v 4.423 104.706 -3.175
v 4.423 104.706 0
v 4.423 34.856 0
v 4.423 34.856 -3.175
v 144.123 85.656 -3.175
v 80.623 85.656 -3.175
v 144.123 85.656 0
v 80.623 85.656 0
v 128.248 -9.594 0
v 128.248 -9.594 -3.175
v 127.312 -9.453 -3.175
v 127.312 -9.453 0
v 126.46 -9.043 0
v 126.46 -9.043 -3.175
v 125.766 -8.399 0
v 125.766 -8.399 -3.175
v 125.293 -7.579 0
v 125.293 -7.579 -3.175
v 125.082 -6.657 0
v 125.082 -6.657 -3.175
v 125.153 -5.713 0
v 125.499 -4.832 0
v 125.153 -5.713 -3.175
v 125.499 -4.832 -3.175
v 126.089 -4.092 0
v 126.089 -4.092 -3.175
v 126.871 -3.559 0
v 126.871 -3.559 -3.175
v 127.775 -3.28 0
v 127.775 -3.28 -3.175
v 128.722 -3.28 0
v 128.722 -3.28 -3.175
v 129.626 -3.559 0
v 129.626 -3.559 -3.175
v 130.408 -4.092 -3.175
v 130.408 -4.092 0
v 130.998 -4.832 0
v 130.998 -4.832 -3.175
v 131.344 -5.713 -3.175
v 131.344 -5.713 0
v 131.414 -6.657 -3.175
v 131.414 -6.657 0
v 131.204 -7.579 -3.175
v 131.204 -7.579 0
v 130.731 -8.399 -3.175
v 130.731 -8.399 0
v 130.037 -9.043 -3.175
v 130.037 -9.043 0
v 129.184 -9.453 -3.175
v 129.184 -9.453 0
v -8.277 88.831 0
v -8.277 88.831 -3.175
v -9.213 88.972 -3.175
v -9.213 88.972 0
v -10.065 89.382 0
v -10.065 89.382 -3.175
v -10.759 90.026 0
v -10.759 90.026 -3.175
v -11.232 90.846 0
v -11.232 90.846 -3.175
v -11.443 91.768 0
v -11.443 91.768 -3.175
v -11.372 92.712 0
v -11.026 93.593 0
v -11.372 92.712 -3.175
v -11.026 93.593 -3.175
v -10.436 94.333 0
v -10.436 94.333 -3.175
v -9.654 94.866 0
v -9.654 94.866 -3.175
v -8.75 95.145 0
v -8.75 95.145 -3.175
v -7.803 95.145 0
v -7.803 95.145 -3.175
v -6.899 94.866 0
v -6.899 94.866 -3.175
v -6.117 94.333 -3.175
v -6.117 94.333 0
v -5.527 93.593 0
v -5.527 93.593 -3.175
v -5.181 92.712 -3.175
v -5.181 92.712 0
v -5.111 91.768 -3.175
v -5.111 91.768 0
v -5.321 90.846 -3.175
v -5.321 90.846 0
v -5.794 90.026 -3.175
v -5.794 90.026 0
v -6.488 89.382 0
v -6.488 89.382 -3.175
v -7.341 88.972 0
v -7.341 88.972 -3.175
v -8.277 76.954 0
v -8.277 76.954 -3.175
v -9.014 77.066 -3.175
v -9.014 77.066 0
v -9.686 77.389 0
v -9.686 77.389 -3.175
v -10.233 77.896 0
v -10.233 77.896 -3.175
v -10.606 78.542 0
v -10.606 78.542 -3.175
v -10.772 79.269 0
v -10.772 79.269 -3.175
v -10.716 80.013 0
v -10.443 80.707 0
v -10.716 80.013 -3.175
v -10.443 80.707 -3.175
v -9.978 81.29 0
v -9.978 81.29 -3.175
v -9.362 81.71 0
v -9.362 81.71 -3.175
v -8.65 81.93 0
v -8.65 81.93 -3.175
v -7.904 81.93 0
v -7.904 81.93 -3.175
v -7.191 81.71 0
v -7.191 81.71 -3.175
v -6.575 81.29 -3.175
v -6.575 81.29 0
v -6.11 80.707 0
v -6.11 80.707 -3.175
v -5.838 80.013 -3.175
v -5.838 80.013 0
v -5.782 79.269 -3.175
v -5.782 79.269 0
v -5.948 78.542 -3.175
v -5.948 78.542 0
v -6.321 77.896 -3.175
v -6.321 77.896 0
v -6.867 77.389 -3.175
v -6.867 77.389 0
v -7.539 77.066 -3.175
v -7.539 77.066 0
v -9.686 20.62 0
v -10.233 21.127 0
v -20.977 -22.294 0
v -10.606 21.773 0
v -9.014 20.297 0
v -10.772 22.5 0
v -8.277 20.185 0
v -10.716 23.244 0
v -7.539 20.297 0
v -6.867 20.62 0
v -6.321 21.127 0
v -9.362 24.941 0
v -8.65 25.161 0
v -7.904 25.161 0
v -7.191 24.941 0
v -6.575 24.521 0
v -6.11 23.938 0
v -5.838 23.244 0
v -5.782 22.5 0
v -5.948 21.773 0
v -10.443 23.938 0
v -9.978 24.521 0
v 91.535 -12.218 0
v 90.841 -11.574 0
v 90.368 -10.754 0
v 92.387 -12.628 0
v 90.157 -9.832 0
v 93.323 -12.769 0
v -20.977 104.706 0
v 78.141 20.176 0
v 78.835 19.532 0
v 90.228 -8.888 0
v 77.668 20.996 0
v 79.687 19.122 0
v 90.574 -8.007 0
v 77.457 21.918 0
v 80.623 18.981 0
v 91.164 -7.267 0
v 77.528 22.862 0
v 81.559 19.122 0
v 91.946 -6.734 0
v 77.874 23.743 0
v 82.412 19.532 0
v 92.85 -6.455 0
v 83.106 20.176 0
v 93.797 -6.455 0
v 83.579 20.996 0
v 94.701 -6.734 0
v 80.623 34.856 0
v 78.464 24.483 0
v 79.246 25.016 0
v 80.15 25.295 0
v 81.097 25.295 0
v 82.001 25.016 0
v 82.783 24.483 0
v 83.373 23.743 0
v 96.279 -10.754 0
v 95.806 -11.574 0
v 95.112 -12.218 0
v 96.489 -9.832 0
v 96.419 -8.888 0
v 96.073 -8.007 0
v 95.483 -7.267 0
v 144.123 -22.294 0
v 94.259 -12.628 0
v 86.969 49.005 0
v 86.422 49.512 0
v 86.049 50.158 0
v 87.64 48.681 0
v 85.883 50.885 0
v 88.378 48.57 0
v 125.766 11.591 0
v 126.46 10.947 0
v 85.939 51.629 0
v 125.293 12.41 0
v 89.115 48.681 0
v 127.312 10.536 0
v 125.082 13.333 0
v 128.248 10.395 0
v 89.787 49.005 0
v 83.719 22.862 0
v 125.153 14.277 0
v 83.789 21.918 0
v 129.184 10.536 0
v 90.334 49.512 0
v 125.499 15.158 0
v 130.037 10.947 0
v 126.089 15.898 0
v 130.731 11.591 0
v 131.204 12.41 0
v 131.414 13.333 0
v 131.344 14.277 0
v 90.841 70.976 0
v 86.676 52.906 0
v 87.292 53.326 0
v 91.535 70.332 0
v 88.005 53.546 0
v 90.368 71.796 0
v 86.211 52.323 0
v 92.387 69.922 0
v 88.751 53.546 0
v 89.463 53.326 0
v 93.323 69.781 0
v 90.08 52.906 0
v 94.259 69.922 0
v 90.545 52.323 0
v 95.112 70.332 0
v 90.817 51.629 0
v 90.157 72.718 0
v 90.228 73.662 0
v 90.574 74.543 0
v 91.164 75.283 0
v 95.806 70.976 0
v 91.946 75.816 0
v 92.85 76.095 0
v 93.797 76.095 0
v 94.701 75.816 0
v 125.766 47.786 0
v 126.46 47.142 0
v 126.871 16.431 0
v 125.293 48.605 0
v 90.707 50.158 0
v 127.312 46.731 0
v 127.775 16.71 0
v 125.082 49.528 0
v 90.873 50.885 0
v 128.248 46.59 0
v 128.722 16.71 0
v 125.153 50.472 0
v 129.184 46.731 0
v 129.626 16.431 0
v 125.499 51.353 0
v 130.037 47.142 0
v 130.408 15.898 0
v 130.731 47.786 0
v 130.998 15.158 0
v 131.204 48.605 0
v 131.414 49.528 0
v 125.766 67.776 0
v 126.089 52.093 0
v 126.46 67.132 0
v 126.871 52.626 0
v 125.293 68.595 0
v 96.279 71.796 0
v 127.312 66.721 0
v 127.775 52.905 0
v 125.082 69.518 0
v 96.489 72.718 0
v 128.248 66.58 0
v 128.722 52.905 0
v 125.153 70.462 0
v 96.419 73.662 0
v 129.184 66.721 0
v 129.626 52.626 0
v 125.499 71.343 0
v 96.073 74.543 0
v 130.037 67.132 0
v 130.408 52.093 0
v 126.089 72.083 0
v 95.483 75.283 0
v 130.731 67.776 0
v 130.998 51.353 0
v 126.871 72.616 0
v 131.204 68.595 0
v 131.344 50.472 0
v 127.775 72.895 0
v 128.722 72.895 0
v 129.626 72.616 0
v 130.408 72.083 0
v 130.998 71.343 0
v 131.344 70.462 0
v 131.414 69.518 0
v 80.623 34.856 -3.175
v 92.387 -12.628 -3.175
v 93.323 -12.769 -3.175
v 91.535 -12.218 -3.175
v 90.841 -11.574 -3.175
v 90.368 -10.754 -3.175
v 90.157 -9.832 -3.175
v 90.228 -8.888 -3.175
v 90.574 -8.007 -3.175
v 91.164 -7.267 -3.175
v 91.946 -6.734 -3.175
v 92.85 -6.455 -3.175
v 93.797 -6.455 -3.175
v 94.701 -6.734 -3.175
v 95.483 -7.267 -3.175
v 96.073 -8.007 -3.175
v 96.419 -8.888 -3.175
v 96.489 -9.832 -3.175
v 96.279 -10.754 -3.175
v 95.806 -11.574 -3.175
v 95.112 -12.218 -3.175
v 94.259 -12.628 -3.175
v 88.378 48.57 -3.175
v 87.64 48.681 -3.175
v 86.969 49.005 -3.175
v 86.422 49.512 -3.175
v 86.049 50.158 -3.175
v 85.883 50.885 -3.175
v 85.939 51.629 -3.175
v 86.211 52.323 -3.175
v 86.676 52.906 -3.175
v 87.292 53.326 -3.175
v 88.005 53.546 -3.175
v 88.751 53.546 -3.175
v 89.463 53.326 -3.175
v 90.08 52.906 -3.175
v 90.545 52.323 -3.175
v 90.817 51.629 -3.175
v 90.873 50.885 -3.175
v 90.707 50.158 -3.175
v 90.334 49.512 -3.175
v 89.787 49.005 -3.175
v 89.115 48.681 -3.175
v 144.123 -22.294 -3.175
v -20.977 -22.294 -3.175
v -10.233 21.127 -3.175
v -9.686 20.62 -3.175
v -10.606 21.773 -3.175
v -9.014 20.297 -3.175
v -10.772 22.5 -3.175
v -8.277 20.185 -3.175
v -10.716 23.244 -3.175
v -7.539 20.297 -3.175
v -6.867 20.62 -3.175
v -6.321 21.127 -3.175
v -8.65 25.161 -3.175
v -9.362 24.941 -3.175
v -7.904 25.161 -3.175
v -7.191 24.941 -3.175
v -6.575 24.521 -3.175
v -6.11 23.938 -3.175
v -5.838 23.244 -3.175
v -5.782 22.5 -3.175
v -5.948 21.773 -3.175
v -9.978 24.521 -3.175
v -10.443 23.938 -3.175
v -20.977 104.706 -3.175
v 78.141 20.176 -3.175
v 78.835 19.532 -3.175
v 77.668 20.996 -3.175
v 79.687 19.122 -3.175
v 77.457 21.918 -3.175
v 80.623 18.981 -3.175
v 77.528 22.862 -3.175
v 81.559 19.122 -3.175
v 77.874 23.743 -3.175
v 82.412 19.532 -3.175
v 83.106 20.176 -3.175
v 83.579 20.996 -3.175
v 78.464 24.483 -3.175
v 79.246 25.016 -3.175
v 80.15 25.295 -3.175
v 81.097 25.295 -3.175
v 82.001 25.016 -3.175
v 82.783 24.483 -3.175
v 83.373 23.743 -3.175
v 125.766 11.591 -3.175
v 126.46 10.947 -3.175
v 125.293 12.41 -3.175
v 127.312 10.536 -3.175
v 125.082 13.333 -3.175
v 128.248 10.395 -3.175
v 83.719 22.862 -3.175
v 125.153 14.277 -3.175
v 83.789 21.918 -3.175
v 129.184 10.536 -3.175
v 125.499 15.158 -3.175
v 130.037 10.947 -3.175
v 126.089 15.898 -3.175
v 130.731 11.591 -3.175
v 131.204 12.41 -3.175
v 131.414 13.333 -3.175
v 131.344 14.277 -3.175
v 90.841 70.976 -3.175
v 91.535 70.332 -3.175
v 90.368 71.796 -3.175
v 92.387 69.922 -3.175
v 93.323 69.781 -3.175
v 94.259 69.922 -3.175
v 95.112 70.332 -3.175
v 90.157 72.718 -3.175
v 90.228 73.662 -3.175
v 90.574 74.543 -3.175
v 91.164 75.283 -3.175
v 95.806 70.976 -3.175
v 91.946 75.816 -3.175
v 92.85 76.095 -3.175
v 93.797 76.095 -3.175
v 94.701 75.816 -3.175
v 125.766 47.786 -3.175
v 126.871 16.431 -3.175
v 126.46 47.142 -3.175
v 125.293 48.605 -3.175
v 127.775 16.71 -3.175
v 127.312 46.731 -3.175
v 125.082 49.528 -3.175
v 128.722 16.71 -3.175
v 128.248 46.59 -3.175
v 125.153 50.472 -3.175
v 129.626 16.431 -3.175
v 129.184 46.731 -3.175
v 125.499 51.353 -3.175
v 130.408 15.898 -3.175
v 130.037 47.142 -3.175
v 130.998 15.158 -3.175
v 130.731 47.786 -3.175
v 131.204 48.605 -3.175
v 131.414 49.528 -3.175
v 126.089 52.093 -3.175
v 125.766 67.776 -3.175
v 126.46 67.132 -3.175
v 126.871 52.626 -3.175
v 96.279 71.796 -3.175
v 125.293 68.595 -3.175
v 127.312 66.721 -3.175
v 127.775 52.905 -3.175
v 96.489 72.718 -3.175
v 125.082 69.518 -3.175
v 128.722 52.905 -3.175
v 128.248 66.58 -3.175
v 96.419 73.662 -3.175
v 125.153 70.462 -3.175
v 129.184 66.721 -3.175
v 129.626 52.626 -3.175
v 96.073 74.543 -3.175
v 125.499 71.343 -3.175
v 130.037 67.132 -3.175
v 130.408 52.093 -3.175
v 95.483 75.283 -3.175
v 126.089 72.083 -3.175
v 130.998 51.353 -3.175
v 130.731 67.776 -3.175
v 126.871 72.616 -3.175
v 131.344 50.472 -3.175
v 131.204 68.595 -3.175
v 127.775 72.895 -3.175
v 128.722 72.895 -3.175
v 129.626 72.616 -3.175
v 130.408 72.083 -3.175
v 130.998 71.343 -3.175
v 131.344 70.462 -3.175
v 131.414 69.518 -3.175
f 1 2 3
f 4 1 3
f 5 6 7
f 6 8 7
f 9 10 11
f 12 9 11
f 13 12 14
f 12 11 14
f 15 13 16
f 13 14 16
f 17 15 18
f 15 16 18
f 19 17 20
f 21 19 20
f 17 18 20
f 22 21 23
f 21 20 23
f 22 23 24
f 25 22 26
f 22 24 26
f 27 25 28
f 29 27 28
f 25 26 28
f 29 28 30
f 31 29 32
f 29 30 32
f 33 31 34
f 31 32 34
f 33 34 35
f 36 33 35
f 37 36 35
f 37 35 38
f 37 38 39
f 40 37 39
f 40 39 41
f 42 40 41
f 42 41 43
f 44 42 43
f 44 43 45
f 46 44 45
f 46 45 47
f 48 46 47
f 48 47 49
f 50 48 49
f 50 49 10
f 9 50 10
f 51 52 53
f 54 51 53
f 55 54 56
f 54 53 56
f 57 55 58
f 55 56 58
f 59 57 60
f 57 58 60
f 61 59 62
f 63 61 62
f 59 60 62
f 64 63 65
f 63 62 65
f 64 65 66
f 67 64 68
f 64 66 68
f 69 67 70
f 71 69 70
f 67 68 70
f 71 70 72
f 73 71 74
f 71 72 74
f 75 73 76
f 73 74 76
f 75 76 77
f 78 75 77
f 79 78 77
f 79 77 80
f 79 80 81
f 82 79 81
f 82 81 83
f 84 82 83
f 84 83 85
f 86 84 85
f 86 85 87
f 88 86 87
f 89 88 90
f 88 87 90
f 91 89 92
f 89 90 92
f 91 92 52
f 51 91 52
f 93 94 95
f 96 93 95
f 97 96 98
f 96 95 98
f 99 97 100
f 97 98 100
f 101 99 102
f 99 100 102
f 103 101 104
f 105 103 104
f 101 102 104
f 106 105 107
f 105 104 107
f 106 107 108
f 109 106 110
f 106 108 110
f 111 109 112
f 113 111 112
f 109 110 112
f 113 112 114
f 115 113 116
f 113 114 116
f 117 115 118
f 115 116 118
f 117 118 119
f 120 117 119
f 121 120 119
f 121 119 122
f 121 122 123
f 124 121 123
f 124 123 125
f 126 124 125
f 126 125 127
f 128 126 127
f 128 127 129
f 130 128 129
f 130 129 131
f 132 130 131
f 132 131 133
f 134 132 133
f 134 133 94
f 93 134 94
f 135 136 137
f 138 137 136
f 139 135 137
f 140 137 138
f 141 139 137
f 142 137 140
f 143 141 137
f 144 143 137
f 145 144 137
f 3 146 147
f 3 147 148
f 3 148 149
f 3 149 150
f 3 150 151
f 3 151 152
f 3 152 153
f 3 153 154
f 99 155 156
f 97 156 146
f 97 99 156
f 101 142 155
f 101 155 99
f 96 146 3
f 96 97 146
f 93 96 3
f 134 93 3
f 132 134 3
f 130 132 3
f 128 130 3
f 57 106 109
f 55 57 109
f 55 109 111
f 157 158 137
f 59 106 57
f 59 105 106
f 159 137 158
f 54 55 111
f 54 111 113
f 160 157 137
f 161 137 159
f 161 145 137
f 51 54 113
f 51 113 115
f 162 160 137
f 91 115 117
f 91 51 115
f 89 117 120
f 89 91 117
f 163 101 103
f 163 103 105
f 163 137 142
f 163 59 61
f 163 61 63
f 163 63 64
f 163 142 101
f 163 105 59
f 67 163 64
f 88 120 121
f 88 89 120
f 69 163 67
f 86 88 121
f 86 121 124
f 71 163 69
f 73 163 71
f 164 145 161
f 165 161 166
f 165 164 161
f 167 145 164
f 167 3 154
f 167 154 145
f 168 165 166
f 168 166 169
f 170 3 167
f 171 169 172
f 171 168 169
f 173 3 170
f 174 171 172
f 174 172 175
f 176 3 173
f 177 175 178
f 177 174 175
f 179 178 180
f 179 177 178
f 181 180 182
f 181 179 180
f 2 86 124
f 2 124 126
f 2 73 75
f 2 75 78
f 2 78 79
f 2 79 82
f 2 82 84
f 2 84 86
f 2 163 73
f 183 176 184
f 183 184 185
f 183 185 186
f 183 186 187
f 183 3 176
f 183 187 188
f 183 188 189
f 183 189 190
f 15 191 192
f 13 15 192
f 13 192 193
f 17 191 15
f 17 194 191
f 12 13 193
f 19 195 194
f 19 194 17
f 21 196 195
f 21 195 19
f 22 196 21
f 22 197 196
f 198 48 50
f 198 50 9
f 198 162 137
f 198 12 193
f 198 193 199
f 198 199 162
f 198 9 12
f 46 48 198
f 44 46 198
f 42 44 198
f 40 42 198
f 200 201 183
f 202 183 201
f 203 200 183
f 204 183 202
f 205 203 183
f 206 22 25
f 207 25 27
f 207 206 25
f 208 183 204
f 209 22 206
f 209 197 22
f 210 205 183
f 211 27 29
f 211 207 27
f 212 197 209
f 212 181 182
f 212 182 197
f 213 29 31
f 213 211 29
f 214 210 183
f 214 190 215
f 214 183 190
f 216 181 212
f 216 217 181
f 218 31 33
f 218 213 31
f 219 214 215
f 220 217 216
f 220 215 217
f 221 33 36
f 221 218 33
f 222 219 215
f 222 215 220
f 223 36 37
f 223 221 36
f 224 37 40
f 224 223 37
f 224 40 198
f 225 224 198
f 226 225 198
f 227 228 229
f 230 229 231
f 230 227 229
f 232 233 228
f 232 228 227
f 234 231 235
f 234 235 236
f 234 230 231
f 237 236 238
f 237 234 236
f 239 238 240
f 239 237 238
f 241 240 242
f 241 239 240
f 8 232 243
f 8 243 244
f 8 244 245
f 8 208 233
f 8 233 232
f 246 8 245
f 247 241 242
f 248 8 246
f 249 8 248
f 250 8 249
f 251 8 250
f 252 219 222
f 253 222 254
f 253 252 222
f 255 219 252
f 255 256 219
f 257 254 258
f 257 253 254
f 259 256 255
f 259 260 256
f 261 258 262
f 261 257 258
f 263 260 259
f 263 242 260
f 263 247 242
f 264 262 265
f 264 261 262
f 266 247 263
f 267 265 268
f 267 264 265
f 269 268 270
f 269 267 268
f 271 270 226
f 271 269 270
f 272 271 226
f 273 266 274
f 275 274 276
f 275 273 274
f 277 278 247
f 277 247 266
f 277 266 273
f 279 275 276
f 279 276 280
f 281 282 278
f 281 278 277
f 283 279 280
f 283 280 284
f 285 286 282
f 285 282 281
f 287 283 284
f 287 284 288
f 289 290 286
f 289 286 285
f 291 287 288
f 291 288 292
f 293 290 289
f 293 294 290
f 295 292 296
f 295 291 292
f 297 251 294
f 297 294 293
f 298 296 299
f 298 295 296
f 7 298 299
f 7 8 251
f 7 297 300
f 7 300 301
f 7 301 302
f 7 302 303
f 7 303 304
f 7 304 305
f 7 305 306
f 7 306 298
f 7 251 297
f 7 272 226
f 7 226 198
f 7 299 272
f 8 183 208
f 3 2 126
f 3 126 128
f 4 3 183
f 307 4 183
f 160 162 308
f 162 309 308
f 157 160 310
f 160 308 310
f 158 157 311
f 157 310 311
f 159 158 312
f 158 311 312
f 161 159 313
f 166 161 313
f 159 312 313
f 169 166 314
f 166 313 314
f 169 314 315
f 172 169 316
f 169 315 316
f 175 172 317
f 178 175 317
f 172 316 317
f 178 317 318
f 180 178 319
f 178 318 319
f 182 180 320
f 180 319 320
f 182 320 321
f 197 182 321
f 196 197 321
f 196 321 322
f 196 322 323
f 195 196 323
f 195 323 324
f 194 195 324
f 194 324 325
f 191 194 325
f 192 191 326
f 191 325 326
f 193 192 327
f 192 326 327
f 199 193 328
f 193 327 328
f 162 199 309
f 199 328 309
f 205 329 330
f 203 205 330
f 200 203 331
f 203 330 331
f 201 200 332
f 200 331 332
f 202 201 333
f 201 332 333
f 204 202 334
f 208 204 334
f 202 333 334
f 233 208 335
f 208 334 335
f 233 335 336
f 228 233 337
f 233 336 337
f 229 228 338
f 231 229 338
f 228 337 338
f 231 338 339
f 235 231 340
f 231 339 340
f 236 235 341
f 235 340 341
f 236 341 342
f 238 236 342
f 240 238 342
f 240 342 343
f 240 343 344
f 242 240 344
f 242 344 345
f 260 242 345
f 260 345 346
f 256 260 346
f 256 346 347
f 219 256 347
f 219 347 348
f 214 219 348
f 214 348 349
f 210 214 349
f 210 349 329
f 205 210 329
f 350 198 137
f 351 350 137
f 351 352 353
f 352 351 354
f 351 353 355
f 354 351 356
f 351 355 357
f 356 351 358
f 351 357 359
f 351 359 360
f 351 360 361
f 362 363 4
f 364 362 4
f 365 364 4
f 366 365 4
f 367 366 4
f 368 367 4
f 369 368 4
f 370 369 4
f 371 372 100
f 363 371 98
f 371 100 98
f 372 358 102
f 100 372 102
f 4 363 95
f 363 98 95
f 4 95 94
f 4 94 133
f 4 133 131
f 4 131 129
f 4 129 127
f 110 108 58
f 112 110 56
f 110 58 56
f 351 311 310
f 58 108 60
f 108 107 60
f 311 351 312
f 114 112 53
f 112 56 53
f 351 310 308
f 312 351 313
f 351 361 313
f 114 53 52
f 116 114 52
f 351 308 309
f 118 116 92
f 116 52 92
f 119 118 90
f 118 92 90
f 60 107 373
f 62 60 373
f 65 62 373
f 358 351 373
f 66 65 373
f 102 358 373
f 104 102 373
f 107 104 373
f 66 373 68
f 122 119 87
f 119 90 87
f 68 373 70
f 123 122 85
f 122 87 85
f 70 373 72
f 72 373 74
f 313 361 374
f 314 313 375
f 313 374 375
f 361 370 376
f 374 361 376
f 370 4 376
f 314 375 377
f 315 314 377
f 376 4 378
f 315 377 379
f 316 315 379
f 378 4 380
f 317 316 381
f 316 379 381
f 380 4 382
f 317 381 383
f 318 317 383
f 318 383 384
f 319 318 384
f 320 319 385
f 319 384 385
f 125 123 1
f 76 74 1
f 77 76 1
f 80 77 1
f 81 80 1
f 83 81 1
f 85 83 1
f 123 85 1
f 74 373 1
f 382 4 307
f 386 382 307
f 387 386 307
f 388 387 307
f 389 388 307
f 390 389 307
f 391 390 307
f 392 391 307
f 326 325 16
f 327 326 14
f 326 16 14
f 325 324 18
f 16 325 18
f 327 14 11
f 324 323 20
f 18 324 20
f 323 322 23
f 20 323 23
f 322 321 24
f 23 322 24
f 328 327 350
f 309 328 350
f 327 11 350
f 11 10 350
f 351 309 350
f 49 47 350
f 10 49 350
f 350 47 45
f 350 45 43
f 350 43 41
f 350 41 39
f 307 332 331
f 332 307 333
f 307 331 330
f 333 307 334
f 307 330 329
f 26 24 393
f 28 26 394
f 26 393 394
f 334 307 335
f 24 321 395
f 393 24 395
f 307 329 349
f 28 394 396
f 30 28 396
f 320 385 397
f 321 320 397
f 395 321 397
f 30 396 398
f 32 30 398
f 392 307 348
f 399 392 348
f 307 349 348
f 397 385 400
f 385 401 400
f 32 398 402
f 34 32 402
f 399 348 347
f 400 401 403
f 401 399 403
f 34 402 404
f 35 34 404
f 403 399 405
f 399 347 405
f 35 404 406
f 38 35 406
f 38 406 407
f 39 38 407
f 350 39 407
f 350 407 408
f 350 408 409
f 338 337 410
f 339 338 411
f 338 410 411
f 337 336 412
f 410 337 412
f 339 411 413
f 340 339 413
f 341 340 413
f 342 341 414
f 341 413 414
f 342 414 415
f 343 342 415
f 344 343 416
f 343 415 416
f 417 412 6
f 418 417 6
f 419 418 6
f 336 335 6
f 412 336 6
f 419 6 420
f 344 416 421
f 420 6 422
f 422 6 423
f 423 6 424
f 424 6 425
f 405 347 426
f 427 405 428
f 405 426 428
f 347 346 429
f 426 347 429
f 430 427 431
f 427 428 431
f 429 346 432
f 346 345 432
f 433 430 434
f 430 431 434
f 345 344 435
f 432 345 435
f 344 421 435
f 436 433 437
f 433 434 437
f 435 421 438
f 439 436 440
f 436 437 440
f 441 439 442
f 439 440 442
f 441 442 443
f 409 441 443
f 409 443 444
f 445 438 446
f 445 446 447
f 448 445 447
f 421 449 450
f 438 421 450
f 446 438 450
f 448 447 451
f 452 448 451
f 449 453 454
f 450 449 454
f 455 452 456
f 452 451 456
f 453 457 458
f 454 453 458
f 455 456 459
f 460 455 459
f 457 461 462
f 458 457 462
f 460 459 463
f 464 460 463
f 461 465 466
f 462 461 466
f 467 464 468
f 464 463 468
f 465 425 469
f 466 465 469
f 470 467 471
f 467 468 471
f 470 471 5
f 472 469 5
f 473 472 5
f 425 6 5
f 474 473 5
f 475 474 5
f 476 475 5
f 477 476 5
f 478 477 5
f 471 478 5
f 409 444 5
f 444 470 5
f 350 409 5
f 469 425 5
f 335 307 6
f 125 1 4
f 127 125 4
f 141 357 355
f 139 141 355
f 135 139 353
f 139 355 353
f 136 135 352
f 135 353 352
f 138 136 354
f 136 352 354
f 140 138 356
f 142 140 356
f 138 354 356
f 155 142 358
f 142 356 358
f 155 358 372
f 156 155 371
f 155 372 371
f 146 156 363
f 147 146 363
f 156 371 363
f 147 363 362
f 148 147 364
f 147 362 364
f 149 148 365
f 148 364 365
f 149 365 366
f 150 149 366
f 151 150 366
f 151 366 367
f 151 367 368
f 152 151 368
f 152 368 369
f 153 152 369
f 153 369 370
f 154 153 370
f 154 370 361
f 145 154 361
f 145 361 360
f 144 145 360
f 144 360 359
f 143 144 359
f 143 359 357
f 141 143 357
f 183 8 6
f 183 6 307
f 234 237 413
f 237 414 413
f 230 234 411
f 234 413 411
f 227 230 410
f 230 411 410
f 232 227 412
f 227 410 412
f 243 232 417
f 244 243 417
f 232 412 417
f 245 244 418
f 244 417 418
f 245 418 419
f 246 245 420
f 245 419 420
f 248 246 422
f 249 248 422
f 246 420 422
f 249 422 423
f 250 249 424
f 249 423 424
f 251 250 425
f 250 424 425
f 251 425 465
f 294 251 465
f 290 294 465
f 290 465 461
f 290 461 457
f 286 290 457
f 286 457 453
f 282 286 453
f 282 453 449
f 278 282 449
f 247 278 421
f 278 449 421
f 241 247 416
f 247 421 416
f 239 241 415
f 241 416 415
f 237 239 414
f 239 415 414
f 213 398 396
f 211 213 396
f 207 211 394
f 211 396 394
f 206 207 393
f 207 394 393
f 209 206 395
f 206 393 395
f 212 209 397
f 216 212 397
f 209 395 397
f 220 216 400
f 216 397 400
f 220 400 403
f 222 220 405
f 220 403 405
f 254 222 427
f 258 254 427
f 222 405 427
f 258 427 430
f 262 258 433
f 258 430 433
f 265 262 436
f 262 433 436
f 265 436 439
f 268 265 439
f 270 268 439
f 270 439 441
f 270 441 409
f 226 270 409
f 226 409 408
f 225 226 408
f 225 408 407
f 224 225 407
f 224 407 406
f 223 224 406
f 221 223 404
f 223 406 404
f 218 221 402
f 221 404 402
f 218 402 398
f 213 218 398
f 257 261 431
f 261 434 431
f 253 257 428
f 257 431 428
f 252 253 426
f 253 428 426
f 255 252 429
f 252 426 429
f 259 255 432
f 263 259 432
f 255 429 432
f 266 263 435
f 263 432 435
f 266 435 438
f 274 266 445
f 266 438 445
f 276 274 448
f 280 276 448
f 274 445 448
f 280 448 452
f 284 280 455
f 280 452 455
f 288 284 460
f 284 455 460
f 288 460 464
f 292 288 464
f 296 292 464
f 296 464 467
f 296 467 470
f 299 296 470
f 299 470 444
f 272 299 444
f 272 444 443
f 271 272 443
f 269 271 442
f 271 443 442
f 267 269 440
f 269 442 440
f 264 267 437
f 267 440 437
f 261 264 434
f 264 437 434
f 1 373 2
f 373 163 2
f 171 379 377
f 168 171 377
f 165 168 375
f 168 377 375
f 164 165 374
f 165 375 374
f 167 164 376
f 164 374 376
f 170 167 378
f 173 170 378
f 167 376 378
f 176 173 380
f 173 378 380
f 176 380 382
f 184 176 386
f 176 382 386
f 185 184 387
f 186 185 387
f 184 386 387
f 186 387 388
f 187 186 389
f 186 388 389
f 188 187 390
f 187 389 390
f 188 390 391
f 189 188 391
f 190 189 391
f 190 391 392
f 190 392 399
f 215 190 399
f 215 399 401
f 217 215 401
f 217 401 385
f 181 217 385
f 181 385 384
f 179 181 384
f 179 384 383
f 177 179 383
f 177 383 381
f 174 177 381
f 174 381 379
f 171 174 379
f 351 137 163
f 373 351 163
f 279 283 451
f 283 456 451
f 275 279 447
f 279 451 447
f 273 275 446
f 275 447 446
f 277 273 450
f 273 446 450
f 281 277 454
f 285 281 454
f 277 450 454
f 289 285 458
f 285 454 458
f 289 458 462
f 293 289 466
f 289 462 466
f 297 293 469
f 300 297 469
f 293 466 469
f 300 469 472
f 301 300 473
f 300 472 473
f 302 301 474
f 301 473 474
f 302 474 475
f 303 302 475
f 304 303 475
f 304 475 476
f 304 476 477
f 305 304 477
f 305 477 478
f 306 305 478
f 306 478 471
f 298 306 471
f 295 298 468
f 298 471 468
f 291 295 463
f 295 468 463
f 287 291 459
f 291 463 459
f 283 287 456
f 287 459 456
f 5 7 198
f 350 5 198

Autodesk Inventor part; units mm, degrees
ref_plane "YZ Plane" through (0, 0, 0) normal (1, 0, 0) x (0, 1, 0)
ref_plane "XZ Plane" through (0, 0, 0) normal (0, 1, 0) x (-1, 0, 0)
ref_plane "XY Plane" through (0, 0, 0) normal (0, 0, 1) x (1, 0, 0)
sketch "Sketch1" plane through (0, 0, 0) normal (0, 0, 1) x (1, 0, 0)
  line L0 (106.0233, -22.2944) -> (-20.9767, -22.2944)
  line L1 (-20.9767, -22.2944) -> (-20.9767, 104.7056)
  line L2 (4.4233, 104.7056) -> (4.4233, 34.8556)
  line L3 (4.4233, 34.8556) -> (80.6233, 34.8556)
  line L4 (-20.9767, 104.7056) -> (4.4233, 104.7056)
  line L5 (106.0233, -22.2944) -> (106.0233, 85.6556)
  line L6 (106.0233, 85.6556) -> (80.6233, 85.6556)
  line L7 (80.6233, 85.6556) -> (80.6233, 34.8556)
  line L8 (106.0233, 85.6556) -> (144.1233, 85.6556)
  line L9 (144.1233, 85.6556) -> (144.1233, -22.2944)
  line L10 (144.1233, -22.2944) -> (106.0233, -22.2944)
  point P0 (0, 0)
  point P1 (-8.2767, 79.4563)
  point P2 (-8.2767, 22.6873)
  point P3 (88.3779, 51.0718)
  point P4 (93.3233, 72.9556)
  point P5 (-8.2767, 92.0056)
  point P6 (80.6233, 22.1556)
  point P7 (93.3233, -9.5944)
  point P8 (128.2483, 13.5704)
  point P9 (128.2483, -6.4194)
  point P10 (128.2483, 69.7552)
  point P11 (128.2483, 49.7654)
  dimension "d0" = 127
  dimension "d5" = 56.769
  dimension "d6" = 96.6546
  dimension "d7" = 12.7
  dimension "d8" = 25.4
  dimension "d9" = 76.2
  dimension "d12" = 107.95
  dimension "d13" = 25.4
  dimension "d14" = 50.8
  dimension "d22" = 28.3845
  dimension "d23" = 127
  dimension "d24" = 25.4
  dimension "d25" = 12.7
  dimension "d26" = 12.7
  dimension "d27" = 44.45
  dimension "d29" = 12.7
  dimension "d30" = 12.7
  dimension "d38" = 12.7
  dimension "d39" = 12.7
  dimension "d40" = 38.1
  dimension "d41" = 107.95
  dimension "d42" = 19.9898
  dimension "d43" = 15.875
  dimension "d53" = 15.875
  dimension "d54" = 15.875
  dimension "d55" = 15.875
  dimension "d56" = 15.875
  dimension "d57" = 15.9004
  dimension "d58" = 19.9898
extrude "Extrusion1" add sketch "Sketch1" against normal blind 3.175 contours L0 L1 L4 L2 L3 L7 L6 L5
hole "Hole1" at (-8.2767, 79.4563, 0) at (-8.2767, 22.6873, 0) at (88.3779, 51.0718, 0) direction (0, 0, -1) diameter 5.0038 depth 25.4 tip angle 118
hole "Hole2" at (93.3233, 72.9556, 0) at (-8.2767, 92.0056, 0) at (80.6233, 22.1556, 0) at (93.3233, -9.5944, 0) direction (0, 0, -1) diameter 6.35 depth 25.4 tip angle 118
extrude "Extrusion2" add sketch "Sketch1" against normal blind 3.175 contours L5 L8 L9 L10
hole "Hole3" at (128.2483, 13.5704, 0) at (128.2483, -6.4194, 0) at (128.2483, 69.7552, 0) at (128.2483, 49.7654, 0) direction (0, 0, -1) diameter 6.35 depth 25.4 tip angle 118
properties part number "AS5-8-5-001"
